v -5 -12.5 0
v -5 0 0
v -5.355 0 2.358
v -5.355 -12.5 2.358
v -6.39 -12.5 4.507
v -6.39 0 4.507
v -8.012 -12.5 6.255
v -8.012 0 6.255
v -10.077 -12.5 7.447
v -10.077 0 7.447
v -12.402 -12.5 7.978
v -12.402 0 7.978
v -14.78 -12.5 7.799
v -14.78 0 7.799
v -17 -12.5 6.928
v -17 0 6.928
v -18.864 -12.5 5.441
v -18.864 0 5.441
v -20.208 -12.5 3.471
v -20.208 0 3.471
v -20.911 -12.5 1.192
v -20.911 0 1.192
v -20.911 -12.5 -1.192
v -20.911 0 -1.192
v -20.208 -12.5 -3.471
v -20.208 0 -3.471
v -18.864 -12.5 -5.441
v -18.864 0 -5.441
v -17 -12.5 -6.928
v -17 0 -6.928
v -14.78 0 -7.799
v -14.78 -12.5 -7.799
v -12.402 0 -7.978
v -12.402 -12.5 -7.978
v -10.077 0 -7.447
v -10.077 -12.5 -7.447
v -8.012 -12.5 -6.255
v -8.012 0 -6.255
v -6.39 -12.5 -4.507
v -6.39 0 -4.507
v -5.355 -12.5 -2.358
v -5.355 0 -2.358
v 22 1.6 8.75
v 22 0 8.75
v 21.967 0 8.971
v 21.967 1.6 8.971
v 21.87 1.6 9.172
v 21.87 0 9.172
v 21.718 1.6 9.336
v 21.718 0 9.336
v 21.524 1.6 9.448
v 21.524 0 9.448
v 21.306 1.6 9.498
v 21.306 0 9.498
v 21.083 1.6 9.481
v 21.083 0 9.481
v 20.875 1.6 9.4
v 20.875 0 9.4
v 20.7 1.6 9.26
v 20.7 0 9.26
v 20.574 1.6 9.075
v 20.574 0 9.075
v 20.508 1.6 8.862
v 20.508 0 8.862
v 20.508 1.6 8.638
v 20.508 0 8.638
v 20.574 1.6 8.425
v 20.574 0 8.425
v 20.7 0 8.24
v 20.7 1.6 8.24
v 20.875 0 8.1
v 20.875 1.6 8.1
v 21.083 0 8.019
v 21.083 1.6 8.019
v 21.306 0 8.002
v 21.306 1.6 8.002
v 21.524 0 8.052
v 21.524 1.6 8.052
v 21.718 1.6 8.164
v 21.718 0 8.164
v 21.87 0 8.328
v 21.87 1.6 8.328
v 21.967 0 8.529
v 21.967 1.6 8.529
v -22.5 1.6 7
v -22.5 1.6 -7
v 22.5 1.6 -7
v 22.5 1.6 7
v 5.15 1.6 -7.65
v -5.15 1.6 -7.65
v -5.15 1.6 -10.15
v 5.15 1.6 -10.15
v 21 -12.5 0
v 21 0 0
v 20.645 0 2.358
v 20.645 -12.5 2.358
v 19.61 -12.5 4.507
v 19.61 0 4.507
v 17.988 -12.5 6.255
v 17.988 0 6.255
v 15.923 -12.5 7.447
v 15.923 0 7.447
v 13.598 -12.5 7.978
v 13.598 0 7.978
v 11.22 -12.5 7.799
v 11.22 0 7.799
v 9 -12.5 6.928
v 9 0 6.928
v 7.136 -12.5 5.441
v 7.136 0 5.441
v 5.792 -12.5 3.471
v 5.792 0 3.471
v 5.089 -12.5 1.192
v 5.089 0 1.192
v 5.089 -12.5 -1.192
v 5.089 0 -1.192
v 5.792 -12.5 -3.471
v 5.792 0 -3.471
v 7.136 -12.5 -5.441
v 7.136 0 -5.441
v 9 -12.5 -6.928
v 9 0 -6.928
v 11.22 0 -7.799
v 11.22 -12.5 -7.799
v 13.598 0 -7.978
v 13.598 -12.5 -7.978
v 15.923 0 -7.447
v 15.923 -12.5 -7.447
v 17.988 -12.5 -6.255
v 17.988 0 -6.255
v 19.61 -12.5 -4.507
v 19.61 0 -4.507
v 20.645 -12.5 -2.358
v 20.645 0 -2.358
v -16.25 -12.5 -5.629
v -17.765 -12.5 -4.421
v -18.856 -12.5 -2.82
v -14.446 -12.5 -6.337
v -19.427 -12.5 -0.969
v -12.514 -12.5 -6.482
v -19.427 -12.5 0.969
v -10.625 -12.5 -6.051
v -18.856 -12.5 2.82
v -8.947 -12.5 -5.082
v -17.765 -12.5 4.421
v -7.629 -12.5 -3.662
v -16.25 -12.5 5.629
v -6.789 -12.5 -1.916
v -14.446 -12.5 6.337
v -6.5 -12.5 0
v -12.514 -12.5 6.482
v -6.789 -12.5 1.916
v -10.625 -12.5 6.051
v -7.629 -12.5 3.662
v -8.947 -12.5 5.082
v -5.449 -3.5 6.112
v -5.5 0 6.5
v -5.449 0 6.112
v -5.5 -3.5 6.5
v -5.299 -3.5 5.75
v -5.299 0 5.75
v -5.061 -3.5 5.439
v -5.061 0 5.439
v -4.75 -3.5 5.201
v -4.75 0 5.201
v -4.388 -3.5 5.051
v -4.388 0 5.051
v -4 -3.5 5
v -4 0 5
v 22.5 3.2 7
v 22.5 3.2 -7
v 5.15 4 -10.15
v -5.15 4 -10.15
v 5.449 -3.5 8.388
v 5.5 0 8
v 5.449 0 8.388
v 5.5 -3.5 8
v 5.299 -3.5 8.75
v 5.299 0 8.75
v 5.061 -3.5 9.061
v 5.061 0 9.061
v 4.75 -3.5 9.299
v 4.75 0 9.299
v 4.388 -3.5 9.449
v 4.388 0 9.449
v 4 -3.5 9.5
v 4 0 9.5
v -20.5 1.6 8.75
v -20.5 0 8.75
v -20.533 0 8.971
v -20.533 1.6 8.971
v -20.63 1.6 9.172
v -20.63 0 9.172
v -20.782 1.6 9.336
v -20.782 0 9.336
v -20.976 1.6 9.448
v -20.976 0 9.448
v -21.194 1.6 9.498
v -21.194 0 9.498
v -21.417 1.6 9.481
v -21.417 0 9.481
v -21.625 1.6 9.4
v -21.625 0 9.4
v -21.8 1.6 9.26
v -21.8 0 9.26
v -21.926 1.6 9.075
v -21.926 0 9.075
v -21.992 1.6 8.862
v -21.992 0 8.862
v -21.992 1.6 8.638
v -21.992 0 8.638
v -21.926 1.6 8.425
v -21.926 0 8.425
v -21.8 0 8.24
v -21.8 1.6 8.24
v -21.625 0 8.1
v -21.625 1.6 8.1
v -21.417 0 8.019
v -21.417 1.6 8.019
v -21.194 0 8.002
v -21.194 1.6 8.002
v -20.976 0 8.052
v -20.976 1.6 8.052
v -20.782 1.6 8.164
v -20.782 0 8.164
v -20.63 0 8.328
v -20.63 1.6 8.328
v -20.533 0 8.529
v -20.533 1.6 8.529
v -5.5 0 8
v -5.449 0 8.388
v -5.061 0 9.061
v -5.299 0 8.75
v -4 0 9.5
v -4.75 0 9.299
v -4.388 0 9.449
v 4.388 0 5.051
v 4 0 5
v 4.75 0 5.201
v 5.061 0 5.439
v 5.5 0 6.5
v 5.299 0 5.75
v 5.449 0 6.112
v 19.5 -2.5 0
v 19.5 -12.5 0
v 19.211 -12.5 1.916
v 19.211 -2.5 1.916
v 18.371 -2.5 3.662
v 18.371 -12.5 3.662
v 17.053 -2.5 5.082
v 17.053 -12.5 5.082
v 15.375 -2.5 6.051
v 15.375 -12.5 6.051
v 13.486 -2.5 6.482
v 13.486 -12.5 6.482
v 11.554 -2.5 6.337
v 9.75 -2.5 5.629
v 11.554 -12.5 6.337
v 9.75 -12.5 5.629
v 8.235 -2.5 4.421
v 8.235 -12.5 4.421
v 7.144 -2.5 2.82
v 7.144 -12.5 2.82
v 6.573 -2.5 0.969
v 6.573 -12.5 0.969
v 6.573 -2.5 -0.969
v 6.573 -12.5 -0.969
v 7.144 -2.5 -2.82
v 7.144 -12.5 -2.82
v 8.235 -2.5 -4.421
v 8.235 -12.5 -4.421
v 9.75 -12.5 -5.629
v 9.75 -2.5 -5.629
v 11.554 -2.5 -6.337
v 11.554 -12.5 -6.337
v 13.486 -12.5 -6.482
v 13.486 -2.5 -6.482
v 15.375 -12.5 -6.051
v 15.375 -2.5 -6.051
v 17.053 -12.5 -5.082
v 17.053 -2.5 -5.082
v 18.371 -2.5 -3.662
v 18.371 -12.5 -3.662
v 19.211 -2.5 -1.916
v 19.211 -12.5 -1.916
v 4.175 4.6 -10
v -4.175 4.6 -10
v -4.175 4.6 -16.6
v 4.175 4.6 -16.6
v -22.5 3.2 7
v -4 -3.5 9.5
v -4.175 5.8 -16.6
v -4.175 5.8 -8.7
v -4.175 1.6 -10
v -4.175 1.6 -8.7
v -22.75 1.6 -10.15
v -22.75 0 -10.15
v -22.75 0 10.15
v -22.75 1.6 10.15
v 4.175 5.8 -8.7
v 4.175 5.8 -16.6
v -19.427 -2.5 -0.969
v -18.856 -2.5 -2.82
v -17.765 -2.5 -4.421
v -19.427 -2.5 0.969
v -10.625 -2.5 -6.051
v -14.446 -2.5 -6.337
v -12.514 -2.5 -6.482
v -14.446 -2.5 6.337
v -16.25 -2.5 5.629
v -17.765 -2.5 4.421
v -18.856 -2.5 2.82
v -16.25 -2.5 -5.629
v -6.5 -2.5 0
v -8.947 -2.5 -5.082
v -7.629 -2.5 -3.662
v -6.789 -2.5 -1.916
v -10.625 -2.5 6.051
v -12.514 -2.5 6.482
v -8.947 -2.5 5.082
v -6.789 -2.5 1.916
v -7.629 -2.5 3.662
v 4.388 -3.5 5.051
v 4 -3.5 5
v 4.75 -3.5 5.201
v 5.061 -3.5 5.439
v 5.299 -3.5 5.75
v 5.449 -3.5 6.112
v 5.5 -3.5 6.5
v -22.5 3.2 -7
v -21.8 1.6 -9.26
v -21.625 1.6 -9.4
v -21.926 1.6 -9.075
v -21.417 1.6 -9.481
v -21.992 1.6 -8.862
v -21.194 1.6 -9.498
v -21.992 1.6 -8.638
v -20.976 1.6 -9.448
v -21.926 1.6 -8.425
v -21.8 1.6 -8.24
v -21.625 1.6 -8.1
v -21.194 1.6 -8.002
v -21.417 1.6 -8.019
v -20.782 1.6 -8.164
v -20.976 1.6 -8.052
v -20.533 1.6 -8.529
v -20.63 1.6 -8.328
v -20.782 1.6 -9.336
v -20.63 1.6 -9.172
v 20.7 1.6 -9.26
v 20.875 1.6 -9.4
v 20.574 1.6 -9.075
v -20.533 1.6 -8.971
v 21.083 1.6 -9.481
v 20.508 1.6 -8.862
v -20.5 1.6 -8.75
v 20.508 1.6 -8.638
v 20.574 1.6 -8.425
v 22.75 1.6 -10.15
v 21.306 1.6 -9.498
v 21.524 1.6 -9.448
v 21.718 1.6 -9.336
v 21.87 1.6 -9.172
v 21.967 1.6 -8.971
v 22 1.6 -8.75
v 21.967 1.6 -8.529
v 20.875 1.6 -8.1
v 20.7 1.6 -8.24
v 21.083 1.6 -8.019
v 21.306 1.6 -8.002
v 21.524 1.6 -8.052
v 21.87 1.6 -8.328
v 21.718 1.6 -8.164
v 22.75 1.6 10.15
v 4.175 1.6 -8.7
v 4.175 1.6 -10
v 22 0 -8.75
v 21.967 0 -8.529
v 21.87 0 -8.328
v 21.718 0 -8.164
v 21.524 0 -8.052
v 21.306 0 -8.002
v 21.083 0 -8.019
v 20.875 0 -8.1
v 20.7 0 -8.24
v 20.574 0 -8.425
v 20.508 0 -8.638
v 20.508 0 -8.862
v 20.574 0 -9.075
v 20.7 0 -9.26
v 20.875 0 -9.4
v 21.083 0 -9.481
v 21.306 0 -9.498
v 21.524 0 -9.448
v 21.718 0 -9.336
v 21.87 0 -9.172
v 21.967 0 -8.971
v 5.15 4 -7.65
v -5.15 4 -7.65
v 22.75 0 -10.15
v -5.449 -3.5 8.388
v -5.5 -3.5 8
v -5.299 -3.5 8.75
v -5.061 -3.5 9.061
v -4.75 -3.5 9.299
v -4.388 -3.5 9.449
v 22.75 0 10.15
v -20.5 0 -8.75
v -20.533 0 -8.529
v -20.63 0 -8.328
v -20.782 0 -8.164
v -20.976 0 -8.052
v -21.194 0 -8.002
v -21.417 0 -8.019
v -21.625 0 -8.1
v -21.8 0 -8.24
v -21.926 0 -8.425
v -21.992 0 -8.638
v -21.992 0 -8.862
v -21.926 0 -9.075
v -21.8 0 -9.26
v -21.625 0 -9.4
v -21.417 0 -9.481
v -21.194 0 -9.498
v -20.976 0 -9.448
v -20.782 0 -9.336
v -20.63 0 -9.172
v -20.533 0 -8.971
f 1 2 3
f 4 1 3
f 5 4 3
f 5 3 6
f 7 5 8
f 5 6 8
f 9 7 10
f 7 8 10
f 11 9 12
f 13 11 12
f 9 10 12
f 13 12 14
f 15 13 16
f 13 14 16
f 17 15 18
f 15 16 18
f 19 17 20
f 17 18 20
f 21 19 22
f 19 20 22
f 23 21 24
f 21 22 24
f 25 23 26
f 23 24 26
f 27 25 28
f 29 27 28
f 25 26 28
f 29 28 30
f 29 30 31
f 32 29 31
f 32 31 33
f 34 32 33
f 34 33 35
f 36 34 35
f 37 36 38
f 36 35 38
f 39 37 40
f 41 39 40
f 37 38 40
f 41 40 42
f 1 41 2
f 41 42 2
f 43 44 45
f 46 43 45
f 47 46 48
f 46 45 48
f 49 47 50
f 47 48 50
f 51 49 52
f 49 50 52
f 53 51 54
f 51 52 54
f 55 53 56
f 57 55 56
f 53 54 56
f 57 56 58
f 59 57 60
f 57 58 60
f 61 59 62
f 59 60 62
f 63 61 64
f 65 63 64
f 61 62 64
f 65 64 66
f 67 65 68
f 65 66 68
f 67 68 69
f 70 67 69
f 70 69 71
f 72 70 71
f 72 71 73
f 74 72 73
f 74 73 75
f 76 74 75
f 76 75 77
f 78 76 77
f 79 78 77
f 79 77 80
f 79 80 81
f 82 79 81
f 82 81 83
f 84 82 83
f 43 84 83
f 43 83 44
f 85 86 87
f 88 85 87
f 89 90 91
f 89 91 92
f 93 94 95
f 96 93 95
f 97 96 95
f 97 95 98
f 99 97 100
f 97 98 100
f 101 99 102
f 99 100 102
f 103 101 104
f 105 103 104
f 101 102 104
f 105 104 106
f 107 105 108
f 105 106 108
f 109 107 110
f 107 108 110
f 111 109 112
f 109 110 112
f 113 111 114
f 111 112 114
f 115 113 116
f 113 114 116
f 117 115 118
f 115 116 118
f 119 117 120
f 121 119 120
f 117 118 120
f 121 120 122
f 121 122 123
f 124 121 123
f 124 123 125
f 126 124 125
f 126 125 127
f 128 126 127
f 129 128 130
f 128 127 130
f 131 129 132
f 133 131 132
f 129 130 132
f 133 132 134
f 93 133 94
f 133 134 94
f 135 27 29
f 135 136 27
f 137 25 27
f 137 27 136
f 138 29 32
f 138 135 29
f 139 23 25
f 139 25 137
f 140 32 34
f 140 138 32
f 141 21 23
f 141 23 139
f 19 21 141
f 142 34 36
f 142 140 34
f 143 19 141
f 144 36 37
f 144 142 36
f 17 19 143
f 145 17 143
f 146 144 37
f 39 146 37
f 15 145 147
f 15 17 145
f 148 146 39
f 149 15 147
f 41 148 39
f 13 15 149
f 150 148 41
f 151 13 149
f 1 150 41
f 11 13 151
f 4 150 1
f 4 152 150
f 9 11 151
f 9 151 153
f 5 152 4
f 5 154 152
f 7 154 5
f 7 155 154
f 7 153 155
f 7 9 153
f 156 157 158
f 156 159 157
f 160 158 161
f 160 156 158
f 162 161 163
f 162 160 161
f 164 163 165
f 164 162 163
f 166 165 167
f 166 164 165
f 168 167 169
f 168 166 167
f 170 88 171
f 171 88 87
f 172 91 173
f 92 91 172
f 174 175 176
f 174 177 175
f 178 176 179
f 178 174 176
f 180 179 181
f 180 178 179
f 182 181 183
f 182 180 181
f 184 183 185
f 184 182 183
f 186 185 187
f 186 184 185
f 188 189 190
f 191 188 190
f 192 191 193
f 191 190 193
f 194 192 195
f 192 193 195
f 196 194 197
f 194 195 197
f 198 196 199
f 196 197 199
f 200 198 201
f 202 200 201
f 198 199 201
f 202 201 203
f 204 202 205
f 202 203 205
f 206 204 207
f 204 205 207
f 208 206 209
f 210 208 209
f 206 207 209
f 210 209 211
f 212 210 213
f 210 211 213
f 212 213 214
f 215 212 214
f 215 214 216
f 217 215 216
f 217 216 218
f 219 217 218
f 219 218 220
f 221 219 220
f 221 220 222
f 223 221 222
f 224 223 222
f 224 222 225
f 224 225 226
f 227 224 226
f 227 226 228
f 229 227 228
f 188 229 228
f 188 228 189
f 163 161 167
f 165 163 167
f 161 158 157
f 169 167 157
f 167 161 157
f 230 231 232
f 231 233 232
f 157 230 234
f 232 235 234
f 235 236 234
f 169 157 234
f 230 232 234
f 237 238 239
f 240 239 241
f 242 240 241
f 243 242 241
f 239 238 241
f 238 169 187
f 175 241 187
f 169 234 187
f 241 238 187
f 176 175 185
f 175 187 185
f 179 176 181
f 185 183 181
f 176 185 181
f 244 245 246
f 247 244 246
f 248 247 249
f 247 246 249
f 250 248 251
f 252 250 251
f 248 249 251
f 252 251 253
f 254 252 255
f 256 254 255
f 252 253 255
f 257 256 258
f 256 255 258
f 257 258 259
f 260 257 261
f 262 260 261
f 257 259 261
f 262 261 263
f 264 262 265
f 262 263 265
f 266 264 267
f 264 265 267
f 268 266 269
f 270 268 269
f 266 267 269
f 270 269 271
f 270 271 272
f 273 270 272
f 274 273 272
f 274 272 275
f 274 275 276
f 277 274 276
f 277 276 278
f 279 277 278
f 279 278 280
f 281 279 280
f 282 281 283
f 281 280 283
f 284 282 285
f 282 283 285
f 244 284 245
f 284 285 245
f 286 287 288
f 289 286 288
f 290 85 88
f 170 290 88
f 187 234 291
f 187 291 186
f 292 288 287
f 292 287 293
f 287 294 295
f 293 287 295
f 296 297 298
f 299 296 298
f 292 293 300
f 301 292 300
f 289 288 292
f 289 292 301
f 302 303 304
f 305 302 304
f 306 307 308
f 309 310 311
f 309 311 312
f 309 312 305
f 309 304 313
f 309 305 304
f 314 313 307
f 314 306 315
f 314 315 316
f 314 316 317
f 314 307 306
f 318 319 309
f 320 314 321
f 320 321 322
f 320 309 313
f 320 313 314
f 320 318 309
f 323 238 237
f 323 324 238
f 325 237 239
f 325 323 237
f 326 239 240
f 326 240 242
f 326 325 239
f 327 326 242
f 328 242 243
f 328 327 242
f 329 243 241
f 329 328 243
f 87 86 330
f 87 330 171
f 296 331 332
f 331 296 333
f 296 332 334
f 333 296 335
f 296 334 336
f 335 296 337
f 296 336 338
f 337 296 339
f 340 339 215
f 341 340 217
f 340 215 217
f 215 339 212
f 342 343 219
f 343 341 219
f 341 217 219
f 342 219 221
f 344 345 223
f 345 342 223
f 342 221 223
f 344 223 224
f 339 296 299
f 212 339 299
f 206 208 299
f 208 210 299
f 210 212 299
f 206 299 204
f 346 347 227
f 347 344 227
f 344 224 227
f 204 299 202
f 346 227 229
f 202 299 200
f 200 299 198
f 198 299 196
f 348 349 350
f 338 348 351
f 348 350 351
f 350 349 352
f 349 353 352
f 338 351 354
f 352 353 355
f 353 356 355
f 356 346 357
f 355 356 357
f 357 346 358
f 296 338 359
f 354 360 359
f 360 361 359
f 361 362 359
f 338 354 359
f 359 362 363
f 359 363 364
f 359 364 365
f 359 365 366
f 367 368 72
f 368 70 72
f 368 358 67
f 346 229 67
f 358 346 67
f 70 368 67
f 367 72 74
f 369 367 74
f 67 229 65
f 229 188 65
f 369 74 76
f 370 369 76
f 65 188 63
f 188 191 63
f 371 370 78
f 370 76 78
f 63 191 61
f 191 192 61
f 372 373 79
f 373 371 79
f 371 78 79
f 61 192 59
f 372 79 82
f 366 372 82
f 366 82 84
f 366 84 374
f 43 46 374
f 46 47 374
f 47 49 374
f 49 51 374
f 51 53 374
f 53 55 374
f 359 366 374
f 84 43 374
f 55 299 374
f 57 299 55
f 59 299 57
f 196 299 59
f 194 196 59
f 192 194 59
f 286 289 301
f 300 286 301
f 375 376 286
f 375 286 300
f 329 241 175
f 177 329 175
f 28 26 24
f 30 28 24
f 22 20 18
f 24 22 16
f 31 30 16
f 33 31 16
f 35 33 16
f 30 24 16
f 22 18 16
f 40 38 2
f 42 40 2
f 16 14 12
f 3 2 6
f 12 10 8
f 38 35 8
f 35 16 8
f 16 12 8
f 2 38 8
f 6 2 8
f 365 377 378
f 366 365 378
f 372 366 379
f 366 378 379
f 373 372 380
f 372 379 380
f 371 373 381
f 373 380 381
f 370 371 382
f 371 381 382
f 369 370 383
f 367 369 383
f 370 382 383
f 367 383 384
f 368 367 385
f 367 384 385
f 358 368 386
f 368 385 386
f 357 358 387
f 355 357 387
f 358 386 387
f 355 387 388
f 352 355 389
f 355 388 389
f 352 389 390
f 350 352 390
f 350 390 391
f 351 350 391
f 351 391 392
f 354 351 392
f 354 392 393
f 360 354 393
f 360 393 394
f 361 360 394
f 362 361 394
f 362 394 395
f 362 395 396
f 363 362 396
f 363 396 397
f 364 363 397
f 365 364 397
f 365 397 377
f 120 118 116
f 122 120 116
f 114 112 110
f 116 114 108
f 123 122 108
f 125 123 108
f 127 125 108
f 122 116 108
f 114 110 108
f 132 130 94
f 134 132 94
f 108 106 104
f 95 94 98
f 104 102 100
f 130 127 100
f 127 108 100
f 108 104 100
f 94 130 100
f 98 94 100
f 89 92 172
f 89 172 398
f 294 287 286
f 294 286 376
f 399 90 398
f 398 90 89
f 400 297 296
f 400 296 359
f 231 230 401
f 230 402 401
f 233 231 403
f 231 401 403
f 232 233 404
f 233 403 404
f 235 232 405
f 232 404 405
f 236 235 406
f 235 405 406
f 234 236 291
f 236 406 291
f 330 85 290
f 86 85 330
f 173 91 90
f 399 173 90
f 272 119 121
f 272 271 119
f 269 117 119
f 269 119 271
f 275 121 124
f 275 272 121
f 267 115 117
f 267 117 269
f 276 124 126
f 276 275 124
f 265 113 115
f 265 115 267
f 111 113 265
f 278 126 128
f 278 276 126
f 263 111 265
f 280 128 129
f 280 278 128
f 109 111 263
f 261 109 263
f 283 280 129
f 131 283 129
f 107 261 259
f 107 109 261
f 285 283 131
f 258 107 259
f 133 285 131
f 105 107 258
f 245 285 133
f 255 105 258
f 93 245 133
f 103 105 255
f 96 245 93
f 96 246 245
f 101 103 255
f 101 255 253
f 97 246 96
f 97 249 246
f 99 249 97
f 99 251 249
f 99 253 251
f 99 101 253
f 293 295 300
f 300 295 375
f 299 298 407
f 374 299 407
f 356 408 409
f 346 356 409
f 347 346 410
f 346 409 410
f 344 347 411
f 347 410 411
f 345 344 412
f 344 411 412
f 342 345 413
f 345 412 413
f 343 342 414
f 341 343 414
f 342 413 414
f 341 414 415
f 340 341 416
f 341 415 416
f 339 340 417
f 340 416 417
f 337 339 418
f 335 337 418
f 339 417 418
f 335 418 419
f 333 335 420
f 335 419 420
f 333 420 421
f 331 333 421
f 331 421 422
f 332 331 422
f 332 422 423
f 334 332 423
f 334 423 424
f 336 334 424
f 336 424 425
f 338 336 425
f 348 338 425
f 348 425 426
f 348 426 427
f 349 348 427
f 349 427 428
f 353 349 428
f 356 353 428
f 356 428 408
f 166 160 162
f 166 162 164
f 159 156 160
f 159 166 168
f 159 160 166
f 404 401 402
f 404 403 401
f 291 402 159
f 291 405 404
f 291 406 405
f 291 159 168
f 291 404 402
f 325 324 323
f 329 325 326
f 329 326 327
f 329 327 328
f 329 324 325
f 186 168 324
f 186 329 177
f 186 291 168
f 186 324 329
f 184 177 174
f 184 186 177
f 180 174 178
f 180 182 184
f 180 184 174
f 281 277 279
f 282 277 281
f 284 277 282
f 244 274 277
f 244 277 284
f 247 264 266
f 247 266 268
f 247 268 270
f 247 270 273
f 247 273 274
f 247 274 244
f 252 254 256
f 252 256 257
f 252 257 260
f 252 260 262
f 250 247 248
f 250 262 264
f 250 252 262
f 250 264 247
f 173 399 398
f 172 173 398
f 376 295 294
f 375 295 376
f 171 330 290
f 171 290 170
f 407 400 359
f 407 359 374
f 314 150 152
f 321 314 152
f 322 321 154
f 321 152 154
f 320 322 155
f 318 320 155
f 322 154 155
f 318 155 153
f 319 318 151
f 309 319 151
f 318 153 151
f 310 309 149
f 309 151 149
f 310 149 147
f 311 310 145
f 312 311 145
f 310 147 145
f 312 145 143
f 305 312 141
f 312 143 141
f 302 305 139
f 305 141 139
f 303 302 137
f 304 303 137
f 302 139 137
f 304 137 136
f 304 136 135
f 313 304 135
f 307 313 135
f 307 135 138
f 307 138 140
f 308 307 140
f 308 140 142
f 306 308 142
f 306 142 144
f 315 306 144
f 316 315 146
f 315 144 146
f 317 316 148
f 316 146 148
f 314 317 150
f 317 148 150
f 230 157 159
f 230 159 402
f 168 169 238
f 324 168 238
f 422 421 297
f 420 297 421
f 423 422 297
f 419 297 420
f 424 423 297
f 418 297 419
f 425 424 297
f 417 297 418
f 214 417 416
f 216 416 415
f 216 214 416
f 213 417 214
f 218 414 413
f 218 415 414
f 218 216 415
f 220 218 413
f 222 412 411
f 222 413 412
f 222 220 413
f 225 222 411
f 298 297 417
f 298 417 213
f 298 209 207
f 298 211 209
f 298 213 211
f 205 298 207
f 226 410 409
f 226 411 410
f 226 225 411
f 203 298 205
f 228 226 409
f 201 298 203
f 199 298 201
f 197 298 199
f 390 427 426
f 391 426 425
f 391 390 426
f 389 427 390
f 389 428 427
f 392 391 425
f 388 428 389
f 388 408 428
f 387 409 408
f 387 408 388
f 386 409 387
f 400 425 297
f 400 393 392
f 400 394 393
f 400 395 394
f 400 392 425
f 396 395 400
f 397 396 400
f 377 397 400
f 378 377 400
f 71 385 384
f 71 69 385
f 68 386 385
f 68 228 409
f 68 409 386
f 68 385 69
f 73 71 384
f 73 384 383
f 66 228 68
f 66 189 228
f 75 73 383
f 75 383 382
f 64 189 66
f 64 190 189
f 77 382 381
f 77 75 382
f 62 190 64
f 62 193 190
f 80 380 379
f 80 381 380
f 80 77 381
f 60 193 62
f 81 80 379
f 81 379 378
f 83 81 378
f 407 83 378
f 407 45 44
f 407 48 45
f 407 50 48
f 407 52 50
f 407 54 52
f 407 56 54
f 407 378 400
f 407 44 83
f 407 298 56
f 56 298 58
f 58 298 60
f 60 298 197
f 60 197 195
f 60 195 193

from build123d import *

# Parameters (mm, degrees)
SKETCH_W        = 45.5
SKETCH_H        = 20.3
PAD_DEPTH       = 1.6
SKETCH001_R     = 0.75
POCKET_DEPTH    = 5
SKETCH002_R     = 8
PAD001_DEPTH    = 12.5
SKETCH003_R     = 6.5
POCKET001_DEPTH = 10
SKETCH004_R     = 8
PAD002_DEPTH    = 12.5
SKETCH005_R     = 6.5
POCKET002_DEPTH = 10
SKETCH006_W     = 11
SKETCH006_H     = 4.5
PAD003_DEPTH    = 3.5
FILLET_R        = 1.5
SKETCH007_W     = 10.3
SKETCH007_H     = 2.5
PAD004_DEPTH    = 2.4
SKETCH008_W     = 8.35
SKETCH008_H     = 7.9
PAD005_DEPTH    = 4.2
SKETCH009_W     = 20
SKETCH009_H     = 3
POCKET003_DEPTH = 8.351
SKETCH010_W     = 45
SKETCH010_H     = 14
PAD006_DEPTH    = 1.6


with BuildPart() as mainboard:
    # Sketch → Pad (new body)
    with BuildSketch(Plane.XZ):
        Rectangle(SKETCH_W, SKETCH_H)
    extrude(amount=-PAD_DEPTH)

    # Sketch001 → Pocket (cut)
    with BuildSketch(Plane.XZ):
        with Locations((-21.25, 8.75)):
            Circle(SKETCH001_R)
        with Locations((21.25, 8.75)):
            Circle(SKETCH001_R)
        with Locations((21.25, -8.75)):
            Circle(SKETCH001_R)
        with Locations((-21.25, -8.75)):
            Circle(SKETCH001_R)
    extrude(amount=-POCKET_DEPTH, mode=Mode.SUBTRACT)


with BuildPart() as ussens1:
    # Sketch002 → Pad001 (new body)
    with BuildSketch(Plane.XZ):
        with Locations((-13, 0)):
            Circle(SKETCH002_R)
    extrude(amount=PAD001_DEPTH)

    # Sketch003 (on Face3 of Pad001) → Pocket001 (cut)
    with BuildSketch(Plane.XZ.offset(12.5)):
        with Locations((-13, 0)):
            Circle(SKETCH003_R)
    extrude(amount=-POCKET001_DEPTH, mode=Mode.SUBTRACT)


with BuildPart() as ussens2:
    # Sketch004 → Pad002 (new body)
    with BuildSketch(Plane.XZ):
        with Locations((13, 0)):
            Circle(SKETCH004_R)
    extrude(amount=PAD002_DEPTH)

    # Sketch005 (on Face3 of Pad002) → Pocket002 (cut)
    with BuildSketch(Plane.XZ.offset(12.5)):
        with Locations((13, 0)):
            Circle(SKETCH005_R)
    extrude(amount=-POCKET002_DEPTH, mode=Mode.SUBTRACT)


with BuildPart() as sblock:
    # Sketch006 → Pad003 (new body)
    with BuildSketch(Plane.XZ):
        with Locations((0, 7.25)):
            Rectangle(SKETCH006_W, SKETCH006_H)
    extrude(amount=PAD003_DEPTH)

    # Fillet
    fillet_edges = [sblock.edges().sort_by_distance(p)[0] for p in [
        (-5.5, -1.75, 9.5),
        (5.5, -1.75, 9.5),
        (5.5, -1.75, 5),
        (-5.5, -1.75, 5),
    ]]
    fillet(fillet_edges, radius=FILLET_R)


with BuildPart() as pinblock:
    # Sketch007 (on DatumPlane) → Pad004 (new body)
    with BuildSketch(Plane.XZ.offset(-1.6)):
        with Locations((0, -8.9)):
            Rectangle(SKETCH007_W, SKETCH007_H)
    extrude(amount=-PAD004_DEPTH)


with BuildPart() as pins:
    # Sketch008 (on DatumPlane) → Pad005 (new body)
    with BuildSketch(Plane.XZ.offset(-1.6)):
        with Locations((0, -12.65)):
            Rectangle(SKETCH008_W, SKETCH008_H)
    extrude(amount=-PAD005_DEPTH)

    # Sketch009 (on Face4 of Pad005) → Pocket003 (cut, through all)
    with BuildSketch(Plane(origin=(-4.175, 1.6, 0), x_dir=(0, 0, -1), z_dir=(-1, 0, 0))):
        with Locations((20, -1.5)):
            Rectangle(SKETCH009_W, SKETCH009_H)
    extrude(amount=-POCKET003_DEPTH, mode=Mode.SUBTRACT)


with BuildPart() as backsolderchips:
    # Sketch010 (on Face1 of CopyPocket) → Pad006 (new body)
    with BuildSketch(Plane(origin=(0, 1.6, 0), x_dir=(1, 0, 0), z_dir=(0, 1, 0))):
        Rectangle(SKETCH010_W, SKETCH010_H)
    extrude(amount=PAD006_DEPTH)


solid = Compound([mainboard.part, ussens1.part, ussens2.part, sblock.part, pinblock.part, pins.part, backsolderchips.part])
